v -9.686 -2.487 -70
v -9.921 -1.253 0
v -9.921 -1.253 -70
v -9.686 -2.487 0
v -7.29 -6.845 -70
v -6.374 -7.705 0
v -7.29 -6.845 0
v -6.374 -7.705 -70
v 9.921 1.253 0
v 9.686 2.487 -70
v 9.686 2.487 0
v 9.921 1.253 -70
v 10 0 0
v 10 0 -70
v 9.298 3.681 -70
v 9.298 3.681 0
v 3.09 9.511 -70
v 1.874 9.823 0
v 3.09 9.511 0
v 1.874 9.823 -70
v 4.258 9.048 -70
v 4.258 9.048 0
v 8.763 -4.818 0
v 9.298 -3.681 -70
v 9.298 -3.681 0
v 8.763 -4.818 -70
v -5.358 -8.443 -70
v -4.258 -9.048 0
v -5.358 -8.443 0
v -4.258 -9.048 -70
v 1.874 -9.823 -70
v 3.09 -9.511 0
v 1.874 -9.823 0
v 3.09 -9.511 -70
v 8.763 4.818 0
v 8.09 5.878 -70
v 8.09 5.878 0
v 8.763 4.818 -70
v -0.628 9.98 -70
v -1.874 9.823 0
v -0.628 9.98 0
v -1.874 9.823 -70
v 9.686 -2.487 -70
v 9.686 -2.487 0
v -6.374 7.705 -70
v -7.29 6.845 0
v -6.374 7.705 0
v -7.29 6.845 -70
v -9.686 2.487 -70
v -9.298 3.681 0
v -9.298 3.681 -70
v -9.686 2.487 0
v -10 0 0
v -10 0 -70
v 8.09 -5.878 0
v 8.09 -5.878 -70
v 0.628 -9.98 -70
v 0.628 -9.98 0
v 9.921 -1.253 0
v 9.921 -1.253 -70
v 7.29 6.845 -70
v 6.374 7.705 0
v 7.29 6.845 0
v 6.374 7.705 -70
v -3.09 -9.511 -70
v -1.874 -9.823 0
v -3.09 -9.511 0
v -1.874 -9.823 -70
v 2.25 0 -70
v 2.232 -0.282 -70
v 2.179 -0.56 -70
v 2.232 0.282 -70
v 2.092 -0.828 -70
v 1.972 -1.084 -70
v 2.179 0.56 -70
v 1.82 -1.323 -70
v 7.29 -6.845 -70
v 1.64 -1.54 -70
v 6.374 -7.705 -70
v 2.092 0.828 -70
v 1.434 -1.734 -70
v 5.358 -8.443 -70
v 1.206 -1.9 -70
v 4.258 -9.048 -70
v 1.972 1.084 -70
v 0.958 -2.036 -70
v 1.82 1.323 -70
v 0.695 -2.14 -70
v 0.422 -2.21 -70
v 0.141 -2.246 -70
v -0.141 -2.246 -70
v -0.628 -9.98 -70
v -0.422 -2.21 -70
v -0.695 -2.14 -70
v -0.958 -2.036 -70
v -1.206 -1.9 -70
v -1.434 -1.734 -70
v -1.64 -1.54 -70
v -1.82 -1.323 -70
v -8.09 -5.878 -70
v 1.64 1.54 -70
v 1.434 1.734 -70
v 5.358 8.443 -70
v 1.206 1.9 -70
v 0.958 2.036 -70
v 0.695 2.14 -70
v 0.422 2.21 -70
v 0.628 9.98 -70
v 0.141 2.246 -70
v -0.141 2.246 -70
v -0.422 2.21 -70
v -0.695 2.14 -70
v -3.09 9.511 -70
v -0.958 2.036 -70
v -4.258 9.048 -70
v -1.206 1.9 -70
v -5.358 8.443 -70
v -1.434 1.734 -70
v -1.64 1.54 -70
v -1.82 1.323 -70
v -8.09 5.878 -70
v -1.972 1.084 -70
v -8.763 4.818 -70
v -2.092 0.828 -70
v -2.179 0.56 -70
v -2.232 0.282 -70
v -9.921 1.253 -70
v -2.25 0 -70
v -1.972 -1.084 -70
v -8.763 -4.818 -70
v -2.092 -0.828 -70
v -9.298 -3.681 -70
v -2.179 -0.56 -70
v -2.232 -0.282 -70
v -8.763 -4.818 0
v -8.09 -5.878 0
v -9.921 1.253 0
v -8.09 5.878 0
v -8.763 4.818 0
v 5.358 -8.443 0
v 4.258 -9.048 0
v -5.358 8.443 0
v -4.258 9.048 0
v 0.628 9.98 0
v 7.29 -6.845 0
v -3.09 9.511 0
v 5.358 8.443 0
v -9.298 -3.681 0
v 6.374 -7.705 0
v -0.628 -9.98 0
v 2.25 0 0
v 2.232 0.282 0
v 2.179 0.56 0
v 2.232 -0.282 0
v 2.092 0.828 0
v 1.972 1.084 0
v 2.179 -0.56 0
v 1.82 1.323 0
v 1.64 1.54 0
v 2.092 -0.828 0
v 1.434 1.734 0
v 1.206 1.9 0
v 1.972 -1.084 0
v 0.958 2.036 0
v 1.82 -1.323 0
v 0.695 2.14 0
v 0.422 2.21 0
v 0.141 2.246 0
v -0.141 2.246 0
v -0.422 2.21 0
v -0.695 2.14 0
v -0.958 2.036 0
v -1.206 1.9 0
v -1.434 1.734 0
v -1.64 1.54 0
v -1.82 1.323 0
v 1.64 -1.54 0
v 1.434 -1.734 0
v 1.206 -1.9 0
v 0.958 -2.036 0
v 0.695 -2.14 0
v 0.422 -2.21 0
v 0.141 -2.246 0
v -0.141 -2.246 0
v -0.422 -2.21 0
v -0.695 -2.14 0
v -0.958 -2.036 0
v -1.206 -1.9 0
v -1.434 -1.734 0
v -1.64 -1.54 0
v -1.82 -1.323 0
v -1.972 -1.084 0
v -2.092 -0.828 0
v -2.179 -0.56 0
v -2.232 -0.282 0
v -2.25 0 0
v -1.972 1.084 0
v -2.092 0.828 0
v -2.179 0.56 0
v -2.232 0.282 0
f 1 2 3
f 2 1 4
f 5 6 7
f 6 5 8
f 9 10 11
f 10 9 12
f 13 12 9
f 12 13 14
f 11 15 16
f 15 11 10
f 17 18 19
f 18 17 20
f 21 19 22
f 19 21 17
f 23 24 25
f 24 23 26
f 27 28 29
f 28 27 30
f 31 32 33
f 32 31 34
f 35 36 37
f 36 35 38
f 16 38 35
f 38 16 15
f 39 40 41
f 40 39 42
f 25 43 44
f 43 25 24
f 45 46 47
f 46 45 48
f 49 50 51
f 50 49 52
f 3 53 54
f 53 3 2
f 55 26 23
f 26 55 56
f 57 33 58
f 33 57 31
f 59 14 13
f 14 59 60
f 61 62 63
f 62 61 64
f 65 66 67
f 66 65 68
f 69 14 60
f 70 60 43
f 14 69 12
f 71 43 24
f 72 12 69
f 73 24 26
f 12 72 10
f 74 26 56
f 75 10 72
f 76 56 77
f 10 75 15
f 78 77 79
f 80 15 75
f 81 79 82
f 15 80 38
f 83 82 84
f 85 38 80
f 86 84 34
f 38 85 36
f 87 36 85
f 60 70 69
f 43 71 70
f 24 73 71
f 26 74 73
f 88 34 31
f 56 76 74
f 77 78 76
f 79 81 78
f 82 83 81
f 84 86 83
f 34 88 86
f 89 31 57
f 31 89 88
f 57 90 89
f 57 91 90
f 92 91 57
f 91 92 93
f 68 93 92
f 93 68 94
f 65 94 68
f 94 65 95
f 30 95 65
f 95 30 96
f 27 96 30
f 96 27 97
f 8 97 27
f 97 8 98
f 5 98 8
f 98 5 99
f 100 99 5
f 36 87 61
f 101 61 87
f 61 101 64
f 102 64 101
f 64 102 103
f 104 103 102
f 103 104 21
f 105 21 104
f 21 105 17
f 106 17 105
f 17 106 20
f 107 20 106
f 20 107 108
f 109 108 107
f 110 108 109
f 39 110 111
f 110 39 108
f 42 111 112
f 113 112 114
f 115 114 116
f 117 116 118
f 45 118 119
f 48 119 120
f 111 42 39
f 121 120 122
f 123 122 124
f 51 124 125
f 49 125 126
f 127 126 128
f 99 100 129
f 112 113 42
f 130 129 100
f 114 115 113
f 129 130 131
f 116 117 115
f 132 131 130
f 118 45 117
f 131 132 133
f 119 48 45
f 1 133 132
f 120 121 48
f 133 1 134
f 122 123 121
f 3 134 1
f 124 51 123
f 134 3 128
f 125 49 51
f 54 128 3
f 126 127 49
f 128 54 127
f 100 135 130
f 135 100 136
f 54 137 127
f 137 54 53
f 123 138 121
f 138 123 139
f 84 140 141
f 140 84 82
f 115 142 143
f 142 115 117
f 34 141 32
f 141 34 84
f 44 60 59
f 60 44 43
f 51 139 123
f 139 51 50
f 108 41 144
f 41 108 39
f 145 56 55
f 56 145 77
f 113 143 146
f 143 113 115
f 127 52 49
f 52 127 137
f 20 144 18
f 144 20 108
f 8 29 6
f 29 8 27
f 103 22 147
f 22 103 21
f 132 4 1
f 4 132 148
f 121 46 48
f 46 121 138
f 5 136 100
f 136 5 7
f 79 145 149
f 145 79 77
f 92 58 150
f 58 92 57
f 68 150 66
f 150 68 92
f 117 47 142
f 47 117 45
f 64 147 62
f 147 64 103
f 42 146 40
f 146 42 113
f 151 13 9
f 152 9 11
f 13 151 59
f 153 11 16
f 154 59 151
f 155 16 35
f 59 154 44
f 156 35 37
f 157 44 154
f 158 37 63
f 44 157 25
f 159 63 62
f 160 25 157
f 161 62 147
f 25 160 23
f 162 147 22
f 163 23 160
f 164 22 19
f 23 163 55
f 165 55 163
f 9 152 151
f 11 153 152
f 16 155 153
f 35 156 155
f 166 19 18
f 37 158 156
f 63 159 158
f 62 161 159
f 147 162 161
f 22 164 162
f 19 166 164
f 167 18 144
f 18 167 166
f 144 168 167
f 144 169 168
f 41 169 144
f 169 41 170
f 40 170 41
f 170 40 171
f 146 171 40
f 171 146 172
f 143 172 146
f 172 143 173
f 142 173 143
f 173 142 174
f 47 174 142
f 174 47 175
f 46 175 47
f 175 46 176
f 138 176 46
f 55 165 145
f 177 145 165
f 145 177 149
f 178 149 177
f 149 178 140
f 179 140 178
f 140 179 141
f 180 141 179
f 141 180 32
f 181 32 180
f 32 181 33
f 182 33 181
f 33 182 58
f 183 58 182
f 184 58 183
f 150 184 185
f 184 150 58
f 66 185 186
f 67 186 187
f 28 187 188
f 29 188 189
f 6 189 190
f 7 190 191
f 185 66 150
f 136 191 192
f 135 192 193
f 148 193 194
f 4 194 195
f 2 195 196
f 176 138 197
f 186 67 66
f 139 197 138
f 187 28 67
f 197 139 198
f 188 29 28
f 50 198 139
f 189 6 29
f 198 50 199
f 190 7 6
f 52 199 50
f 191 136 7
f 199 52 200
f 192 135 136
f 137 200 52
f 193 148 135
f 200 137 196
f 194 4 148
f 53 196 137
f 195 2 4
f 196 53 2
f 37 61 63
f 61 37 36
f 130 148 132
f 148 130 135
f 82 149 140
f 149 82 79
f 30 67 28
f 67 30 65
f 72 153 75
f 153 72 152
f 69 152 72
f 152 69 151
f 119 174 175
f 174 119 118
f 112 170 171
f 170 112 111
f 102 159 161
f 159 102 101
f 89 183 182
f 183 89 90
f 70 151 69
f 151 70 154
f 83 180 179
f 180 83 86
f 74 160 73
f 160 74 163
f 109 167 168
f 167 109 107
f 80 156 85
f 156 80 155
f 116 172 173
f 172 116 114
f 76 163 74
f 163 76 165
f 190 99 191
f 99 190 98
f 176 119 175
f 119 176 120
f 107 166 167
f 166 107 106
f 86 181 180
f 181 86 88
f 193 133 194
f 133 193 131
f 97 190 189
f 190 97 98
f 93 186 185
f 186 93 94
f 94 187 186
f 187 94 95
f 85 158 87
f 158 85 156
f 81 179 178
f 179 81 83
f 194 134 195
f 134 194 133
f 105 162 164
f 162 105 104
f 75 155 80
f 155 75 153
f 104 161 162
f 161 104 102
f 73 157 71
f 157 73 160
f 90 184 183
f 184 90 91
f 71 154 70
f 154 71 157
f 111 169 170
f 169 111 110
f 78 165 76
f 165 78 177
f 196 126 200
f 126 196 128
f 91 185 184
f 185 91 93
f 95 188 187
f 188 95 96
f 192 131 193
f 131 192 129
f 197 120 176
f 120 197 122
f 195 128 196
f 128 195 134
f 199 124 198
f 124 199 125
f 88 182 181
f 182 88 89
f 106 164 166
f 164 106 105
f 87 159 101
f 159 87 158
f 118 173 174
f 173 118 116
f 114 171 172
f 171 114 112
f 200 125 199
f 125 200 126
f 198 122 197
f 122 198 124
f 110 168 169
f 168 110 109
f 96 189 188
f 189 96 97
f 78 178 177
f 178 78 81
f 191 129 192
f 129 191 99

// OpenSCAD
$fn = 50;


difference() {
	union() {
		translate(v = [0, 0, -70.0000000000]) {
			cylinder(h = 70, r = 10.0000000000);
		}
		cylinder(h = 0, r = 13.0000000000);
	}
	union() {
		#translate(v = [0, 0, -70]) {
			cylinder(h = 70, r = 2.2500000000);
		}
	}
}
